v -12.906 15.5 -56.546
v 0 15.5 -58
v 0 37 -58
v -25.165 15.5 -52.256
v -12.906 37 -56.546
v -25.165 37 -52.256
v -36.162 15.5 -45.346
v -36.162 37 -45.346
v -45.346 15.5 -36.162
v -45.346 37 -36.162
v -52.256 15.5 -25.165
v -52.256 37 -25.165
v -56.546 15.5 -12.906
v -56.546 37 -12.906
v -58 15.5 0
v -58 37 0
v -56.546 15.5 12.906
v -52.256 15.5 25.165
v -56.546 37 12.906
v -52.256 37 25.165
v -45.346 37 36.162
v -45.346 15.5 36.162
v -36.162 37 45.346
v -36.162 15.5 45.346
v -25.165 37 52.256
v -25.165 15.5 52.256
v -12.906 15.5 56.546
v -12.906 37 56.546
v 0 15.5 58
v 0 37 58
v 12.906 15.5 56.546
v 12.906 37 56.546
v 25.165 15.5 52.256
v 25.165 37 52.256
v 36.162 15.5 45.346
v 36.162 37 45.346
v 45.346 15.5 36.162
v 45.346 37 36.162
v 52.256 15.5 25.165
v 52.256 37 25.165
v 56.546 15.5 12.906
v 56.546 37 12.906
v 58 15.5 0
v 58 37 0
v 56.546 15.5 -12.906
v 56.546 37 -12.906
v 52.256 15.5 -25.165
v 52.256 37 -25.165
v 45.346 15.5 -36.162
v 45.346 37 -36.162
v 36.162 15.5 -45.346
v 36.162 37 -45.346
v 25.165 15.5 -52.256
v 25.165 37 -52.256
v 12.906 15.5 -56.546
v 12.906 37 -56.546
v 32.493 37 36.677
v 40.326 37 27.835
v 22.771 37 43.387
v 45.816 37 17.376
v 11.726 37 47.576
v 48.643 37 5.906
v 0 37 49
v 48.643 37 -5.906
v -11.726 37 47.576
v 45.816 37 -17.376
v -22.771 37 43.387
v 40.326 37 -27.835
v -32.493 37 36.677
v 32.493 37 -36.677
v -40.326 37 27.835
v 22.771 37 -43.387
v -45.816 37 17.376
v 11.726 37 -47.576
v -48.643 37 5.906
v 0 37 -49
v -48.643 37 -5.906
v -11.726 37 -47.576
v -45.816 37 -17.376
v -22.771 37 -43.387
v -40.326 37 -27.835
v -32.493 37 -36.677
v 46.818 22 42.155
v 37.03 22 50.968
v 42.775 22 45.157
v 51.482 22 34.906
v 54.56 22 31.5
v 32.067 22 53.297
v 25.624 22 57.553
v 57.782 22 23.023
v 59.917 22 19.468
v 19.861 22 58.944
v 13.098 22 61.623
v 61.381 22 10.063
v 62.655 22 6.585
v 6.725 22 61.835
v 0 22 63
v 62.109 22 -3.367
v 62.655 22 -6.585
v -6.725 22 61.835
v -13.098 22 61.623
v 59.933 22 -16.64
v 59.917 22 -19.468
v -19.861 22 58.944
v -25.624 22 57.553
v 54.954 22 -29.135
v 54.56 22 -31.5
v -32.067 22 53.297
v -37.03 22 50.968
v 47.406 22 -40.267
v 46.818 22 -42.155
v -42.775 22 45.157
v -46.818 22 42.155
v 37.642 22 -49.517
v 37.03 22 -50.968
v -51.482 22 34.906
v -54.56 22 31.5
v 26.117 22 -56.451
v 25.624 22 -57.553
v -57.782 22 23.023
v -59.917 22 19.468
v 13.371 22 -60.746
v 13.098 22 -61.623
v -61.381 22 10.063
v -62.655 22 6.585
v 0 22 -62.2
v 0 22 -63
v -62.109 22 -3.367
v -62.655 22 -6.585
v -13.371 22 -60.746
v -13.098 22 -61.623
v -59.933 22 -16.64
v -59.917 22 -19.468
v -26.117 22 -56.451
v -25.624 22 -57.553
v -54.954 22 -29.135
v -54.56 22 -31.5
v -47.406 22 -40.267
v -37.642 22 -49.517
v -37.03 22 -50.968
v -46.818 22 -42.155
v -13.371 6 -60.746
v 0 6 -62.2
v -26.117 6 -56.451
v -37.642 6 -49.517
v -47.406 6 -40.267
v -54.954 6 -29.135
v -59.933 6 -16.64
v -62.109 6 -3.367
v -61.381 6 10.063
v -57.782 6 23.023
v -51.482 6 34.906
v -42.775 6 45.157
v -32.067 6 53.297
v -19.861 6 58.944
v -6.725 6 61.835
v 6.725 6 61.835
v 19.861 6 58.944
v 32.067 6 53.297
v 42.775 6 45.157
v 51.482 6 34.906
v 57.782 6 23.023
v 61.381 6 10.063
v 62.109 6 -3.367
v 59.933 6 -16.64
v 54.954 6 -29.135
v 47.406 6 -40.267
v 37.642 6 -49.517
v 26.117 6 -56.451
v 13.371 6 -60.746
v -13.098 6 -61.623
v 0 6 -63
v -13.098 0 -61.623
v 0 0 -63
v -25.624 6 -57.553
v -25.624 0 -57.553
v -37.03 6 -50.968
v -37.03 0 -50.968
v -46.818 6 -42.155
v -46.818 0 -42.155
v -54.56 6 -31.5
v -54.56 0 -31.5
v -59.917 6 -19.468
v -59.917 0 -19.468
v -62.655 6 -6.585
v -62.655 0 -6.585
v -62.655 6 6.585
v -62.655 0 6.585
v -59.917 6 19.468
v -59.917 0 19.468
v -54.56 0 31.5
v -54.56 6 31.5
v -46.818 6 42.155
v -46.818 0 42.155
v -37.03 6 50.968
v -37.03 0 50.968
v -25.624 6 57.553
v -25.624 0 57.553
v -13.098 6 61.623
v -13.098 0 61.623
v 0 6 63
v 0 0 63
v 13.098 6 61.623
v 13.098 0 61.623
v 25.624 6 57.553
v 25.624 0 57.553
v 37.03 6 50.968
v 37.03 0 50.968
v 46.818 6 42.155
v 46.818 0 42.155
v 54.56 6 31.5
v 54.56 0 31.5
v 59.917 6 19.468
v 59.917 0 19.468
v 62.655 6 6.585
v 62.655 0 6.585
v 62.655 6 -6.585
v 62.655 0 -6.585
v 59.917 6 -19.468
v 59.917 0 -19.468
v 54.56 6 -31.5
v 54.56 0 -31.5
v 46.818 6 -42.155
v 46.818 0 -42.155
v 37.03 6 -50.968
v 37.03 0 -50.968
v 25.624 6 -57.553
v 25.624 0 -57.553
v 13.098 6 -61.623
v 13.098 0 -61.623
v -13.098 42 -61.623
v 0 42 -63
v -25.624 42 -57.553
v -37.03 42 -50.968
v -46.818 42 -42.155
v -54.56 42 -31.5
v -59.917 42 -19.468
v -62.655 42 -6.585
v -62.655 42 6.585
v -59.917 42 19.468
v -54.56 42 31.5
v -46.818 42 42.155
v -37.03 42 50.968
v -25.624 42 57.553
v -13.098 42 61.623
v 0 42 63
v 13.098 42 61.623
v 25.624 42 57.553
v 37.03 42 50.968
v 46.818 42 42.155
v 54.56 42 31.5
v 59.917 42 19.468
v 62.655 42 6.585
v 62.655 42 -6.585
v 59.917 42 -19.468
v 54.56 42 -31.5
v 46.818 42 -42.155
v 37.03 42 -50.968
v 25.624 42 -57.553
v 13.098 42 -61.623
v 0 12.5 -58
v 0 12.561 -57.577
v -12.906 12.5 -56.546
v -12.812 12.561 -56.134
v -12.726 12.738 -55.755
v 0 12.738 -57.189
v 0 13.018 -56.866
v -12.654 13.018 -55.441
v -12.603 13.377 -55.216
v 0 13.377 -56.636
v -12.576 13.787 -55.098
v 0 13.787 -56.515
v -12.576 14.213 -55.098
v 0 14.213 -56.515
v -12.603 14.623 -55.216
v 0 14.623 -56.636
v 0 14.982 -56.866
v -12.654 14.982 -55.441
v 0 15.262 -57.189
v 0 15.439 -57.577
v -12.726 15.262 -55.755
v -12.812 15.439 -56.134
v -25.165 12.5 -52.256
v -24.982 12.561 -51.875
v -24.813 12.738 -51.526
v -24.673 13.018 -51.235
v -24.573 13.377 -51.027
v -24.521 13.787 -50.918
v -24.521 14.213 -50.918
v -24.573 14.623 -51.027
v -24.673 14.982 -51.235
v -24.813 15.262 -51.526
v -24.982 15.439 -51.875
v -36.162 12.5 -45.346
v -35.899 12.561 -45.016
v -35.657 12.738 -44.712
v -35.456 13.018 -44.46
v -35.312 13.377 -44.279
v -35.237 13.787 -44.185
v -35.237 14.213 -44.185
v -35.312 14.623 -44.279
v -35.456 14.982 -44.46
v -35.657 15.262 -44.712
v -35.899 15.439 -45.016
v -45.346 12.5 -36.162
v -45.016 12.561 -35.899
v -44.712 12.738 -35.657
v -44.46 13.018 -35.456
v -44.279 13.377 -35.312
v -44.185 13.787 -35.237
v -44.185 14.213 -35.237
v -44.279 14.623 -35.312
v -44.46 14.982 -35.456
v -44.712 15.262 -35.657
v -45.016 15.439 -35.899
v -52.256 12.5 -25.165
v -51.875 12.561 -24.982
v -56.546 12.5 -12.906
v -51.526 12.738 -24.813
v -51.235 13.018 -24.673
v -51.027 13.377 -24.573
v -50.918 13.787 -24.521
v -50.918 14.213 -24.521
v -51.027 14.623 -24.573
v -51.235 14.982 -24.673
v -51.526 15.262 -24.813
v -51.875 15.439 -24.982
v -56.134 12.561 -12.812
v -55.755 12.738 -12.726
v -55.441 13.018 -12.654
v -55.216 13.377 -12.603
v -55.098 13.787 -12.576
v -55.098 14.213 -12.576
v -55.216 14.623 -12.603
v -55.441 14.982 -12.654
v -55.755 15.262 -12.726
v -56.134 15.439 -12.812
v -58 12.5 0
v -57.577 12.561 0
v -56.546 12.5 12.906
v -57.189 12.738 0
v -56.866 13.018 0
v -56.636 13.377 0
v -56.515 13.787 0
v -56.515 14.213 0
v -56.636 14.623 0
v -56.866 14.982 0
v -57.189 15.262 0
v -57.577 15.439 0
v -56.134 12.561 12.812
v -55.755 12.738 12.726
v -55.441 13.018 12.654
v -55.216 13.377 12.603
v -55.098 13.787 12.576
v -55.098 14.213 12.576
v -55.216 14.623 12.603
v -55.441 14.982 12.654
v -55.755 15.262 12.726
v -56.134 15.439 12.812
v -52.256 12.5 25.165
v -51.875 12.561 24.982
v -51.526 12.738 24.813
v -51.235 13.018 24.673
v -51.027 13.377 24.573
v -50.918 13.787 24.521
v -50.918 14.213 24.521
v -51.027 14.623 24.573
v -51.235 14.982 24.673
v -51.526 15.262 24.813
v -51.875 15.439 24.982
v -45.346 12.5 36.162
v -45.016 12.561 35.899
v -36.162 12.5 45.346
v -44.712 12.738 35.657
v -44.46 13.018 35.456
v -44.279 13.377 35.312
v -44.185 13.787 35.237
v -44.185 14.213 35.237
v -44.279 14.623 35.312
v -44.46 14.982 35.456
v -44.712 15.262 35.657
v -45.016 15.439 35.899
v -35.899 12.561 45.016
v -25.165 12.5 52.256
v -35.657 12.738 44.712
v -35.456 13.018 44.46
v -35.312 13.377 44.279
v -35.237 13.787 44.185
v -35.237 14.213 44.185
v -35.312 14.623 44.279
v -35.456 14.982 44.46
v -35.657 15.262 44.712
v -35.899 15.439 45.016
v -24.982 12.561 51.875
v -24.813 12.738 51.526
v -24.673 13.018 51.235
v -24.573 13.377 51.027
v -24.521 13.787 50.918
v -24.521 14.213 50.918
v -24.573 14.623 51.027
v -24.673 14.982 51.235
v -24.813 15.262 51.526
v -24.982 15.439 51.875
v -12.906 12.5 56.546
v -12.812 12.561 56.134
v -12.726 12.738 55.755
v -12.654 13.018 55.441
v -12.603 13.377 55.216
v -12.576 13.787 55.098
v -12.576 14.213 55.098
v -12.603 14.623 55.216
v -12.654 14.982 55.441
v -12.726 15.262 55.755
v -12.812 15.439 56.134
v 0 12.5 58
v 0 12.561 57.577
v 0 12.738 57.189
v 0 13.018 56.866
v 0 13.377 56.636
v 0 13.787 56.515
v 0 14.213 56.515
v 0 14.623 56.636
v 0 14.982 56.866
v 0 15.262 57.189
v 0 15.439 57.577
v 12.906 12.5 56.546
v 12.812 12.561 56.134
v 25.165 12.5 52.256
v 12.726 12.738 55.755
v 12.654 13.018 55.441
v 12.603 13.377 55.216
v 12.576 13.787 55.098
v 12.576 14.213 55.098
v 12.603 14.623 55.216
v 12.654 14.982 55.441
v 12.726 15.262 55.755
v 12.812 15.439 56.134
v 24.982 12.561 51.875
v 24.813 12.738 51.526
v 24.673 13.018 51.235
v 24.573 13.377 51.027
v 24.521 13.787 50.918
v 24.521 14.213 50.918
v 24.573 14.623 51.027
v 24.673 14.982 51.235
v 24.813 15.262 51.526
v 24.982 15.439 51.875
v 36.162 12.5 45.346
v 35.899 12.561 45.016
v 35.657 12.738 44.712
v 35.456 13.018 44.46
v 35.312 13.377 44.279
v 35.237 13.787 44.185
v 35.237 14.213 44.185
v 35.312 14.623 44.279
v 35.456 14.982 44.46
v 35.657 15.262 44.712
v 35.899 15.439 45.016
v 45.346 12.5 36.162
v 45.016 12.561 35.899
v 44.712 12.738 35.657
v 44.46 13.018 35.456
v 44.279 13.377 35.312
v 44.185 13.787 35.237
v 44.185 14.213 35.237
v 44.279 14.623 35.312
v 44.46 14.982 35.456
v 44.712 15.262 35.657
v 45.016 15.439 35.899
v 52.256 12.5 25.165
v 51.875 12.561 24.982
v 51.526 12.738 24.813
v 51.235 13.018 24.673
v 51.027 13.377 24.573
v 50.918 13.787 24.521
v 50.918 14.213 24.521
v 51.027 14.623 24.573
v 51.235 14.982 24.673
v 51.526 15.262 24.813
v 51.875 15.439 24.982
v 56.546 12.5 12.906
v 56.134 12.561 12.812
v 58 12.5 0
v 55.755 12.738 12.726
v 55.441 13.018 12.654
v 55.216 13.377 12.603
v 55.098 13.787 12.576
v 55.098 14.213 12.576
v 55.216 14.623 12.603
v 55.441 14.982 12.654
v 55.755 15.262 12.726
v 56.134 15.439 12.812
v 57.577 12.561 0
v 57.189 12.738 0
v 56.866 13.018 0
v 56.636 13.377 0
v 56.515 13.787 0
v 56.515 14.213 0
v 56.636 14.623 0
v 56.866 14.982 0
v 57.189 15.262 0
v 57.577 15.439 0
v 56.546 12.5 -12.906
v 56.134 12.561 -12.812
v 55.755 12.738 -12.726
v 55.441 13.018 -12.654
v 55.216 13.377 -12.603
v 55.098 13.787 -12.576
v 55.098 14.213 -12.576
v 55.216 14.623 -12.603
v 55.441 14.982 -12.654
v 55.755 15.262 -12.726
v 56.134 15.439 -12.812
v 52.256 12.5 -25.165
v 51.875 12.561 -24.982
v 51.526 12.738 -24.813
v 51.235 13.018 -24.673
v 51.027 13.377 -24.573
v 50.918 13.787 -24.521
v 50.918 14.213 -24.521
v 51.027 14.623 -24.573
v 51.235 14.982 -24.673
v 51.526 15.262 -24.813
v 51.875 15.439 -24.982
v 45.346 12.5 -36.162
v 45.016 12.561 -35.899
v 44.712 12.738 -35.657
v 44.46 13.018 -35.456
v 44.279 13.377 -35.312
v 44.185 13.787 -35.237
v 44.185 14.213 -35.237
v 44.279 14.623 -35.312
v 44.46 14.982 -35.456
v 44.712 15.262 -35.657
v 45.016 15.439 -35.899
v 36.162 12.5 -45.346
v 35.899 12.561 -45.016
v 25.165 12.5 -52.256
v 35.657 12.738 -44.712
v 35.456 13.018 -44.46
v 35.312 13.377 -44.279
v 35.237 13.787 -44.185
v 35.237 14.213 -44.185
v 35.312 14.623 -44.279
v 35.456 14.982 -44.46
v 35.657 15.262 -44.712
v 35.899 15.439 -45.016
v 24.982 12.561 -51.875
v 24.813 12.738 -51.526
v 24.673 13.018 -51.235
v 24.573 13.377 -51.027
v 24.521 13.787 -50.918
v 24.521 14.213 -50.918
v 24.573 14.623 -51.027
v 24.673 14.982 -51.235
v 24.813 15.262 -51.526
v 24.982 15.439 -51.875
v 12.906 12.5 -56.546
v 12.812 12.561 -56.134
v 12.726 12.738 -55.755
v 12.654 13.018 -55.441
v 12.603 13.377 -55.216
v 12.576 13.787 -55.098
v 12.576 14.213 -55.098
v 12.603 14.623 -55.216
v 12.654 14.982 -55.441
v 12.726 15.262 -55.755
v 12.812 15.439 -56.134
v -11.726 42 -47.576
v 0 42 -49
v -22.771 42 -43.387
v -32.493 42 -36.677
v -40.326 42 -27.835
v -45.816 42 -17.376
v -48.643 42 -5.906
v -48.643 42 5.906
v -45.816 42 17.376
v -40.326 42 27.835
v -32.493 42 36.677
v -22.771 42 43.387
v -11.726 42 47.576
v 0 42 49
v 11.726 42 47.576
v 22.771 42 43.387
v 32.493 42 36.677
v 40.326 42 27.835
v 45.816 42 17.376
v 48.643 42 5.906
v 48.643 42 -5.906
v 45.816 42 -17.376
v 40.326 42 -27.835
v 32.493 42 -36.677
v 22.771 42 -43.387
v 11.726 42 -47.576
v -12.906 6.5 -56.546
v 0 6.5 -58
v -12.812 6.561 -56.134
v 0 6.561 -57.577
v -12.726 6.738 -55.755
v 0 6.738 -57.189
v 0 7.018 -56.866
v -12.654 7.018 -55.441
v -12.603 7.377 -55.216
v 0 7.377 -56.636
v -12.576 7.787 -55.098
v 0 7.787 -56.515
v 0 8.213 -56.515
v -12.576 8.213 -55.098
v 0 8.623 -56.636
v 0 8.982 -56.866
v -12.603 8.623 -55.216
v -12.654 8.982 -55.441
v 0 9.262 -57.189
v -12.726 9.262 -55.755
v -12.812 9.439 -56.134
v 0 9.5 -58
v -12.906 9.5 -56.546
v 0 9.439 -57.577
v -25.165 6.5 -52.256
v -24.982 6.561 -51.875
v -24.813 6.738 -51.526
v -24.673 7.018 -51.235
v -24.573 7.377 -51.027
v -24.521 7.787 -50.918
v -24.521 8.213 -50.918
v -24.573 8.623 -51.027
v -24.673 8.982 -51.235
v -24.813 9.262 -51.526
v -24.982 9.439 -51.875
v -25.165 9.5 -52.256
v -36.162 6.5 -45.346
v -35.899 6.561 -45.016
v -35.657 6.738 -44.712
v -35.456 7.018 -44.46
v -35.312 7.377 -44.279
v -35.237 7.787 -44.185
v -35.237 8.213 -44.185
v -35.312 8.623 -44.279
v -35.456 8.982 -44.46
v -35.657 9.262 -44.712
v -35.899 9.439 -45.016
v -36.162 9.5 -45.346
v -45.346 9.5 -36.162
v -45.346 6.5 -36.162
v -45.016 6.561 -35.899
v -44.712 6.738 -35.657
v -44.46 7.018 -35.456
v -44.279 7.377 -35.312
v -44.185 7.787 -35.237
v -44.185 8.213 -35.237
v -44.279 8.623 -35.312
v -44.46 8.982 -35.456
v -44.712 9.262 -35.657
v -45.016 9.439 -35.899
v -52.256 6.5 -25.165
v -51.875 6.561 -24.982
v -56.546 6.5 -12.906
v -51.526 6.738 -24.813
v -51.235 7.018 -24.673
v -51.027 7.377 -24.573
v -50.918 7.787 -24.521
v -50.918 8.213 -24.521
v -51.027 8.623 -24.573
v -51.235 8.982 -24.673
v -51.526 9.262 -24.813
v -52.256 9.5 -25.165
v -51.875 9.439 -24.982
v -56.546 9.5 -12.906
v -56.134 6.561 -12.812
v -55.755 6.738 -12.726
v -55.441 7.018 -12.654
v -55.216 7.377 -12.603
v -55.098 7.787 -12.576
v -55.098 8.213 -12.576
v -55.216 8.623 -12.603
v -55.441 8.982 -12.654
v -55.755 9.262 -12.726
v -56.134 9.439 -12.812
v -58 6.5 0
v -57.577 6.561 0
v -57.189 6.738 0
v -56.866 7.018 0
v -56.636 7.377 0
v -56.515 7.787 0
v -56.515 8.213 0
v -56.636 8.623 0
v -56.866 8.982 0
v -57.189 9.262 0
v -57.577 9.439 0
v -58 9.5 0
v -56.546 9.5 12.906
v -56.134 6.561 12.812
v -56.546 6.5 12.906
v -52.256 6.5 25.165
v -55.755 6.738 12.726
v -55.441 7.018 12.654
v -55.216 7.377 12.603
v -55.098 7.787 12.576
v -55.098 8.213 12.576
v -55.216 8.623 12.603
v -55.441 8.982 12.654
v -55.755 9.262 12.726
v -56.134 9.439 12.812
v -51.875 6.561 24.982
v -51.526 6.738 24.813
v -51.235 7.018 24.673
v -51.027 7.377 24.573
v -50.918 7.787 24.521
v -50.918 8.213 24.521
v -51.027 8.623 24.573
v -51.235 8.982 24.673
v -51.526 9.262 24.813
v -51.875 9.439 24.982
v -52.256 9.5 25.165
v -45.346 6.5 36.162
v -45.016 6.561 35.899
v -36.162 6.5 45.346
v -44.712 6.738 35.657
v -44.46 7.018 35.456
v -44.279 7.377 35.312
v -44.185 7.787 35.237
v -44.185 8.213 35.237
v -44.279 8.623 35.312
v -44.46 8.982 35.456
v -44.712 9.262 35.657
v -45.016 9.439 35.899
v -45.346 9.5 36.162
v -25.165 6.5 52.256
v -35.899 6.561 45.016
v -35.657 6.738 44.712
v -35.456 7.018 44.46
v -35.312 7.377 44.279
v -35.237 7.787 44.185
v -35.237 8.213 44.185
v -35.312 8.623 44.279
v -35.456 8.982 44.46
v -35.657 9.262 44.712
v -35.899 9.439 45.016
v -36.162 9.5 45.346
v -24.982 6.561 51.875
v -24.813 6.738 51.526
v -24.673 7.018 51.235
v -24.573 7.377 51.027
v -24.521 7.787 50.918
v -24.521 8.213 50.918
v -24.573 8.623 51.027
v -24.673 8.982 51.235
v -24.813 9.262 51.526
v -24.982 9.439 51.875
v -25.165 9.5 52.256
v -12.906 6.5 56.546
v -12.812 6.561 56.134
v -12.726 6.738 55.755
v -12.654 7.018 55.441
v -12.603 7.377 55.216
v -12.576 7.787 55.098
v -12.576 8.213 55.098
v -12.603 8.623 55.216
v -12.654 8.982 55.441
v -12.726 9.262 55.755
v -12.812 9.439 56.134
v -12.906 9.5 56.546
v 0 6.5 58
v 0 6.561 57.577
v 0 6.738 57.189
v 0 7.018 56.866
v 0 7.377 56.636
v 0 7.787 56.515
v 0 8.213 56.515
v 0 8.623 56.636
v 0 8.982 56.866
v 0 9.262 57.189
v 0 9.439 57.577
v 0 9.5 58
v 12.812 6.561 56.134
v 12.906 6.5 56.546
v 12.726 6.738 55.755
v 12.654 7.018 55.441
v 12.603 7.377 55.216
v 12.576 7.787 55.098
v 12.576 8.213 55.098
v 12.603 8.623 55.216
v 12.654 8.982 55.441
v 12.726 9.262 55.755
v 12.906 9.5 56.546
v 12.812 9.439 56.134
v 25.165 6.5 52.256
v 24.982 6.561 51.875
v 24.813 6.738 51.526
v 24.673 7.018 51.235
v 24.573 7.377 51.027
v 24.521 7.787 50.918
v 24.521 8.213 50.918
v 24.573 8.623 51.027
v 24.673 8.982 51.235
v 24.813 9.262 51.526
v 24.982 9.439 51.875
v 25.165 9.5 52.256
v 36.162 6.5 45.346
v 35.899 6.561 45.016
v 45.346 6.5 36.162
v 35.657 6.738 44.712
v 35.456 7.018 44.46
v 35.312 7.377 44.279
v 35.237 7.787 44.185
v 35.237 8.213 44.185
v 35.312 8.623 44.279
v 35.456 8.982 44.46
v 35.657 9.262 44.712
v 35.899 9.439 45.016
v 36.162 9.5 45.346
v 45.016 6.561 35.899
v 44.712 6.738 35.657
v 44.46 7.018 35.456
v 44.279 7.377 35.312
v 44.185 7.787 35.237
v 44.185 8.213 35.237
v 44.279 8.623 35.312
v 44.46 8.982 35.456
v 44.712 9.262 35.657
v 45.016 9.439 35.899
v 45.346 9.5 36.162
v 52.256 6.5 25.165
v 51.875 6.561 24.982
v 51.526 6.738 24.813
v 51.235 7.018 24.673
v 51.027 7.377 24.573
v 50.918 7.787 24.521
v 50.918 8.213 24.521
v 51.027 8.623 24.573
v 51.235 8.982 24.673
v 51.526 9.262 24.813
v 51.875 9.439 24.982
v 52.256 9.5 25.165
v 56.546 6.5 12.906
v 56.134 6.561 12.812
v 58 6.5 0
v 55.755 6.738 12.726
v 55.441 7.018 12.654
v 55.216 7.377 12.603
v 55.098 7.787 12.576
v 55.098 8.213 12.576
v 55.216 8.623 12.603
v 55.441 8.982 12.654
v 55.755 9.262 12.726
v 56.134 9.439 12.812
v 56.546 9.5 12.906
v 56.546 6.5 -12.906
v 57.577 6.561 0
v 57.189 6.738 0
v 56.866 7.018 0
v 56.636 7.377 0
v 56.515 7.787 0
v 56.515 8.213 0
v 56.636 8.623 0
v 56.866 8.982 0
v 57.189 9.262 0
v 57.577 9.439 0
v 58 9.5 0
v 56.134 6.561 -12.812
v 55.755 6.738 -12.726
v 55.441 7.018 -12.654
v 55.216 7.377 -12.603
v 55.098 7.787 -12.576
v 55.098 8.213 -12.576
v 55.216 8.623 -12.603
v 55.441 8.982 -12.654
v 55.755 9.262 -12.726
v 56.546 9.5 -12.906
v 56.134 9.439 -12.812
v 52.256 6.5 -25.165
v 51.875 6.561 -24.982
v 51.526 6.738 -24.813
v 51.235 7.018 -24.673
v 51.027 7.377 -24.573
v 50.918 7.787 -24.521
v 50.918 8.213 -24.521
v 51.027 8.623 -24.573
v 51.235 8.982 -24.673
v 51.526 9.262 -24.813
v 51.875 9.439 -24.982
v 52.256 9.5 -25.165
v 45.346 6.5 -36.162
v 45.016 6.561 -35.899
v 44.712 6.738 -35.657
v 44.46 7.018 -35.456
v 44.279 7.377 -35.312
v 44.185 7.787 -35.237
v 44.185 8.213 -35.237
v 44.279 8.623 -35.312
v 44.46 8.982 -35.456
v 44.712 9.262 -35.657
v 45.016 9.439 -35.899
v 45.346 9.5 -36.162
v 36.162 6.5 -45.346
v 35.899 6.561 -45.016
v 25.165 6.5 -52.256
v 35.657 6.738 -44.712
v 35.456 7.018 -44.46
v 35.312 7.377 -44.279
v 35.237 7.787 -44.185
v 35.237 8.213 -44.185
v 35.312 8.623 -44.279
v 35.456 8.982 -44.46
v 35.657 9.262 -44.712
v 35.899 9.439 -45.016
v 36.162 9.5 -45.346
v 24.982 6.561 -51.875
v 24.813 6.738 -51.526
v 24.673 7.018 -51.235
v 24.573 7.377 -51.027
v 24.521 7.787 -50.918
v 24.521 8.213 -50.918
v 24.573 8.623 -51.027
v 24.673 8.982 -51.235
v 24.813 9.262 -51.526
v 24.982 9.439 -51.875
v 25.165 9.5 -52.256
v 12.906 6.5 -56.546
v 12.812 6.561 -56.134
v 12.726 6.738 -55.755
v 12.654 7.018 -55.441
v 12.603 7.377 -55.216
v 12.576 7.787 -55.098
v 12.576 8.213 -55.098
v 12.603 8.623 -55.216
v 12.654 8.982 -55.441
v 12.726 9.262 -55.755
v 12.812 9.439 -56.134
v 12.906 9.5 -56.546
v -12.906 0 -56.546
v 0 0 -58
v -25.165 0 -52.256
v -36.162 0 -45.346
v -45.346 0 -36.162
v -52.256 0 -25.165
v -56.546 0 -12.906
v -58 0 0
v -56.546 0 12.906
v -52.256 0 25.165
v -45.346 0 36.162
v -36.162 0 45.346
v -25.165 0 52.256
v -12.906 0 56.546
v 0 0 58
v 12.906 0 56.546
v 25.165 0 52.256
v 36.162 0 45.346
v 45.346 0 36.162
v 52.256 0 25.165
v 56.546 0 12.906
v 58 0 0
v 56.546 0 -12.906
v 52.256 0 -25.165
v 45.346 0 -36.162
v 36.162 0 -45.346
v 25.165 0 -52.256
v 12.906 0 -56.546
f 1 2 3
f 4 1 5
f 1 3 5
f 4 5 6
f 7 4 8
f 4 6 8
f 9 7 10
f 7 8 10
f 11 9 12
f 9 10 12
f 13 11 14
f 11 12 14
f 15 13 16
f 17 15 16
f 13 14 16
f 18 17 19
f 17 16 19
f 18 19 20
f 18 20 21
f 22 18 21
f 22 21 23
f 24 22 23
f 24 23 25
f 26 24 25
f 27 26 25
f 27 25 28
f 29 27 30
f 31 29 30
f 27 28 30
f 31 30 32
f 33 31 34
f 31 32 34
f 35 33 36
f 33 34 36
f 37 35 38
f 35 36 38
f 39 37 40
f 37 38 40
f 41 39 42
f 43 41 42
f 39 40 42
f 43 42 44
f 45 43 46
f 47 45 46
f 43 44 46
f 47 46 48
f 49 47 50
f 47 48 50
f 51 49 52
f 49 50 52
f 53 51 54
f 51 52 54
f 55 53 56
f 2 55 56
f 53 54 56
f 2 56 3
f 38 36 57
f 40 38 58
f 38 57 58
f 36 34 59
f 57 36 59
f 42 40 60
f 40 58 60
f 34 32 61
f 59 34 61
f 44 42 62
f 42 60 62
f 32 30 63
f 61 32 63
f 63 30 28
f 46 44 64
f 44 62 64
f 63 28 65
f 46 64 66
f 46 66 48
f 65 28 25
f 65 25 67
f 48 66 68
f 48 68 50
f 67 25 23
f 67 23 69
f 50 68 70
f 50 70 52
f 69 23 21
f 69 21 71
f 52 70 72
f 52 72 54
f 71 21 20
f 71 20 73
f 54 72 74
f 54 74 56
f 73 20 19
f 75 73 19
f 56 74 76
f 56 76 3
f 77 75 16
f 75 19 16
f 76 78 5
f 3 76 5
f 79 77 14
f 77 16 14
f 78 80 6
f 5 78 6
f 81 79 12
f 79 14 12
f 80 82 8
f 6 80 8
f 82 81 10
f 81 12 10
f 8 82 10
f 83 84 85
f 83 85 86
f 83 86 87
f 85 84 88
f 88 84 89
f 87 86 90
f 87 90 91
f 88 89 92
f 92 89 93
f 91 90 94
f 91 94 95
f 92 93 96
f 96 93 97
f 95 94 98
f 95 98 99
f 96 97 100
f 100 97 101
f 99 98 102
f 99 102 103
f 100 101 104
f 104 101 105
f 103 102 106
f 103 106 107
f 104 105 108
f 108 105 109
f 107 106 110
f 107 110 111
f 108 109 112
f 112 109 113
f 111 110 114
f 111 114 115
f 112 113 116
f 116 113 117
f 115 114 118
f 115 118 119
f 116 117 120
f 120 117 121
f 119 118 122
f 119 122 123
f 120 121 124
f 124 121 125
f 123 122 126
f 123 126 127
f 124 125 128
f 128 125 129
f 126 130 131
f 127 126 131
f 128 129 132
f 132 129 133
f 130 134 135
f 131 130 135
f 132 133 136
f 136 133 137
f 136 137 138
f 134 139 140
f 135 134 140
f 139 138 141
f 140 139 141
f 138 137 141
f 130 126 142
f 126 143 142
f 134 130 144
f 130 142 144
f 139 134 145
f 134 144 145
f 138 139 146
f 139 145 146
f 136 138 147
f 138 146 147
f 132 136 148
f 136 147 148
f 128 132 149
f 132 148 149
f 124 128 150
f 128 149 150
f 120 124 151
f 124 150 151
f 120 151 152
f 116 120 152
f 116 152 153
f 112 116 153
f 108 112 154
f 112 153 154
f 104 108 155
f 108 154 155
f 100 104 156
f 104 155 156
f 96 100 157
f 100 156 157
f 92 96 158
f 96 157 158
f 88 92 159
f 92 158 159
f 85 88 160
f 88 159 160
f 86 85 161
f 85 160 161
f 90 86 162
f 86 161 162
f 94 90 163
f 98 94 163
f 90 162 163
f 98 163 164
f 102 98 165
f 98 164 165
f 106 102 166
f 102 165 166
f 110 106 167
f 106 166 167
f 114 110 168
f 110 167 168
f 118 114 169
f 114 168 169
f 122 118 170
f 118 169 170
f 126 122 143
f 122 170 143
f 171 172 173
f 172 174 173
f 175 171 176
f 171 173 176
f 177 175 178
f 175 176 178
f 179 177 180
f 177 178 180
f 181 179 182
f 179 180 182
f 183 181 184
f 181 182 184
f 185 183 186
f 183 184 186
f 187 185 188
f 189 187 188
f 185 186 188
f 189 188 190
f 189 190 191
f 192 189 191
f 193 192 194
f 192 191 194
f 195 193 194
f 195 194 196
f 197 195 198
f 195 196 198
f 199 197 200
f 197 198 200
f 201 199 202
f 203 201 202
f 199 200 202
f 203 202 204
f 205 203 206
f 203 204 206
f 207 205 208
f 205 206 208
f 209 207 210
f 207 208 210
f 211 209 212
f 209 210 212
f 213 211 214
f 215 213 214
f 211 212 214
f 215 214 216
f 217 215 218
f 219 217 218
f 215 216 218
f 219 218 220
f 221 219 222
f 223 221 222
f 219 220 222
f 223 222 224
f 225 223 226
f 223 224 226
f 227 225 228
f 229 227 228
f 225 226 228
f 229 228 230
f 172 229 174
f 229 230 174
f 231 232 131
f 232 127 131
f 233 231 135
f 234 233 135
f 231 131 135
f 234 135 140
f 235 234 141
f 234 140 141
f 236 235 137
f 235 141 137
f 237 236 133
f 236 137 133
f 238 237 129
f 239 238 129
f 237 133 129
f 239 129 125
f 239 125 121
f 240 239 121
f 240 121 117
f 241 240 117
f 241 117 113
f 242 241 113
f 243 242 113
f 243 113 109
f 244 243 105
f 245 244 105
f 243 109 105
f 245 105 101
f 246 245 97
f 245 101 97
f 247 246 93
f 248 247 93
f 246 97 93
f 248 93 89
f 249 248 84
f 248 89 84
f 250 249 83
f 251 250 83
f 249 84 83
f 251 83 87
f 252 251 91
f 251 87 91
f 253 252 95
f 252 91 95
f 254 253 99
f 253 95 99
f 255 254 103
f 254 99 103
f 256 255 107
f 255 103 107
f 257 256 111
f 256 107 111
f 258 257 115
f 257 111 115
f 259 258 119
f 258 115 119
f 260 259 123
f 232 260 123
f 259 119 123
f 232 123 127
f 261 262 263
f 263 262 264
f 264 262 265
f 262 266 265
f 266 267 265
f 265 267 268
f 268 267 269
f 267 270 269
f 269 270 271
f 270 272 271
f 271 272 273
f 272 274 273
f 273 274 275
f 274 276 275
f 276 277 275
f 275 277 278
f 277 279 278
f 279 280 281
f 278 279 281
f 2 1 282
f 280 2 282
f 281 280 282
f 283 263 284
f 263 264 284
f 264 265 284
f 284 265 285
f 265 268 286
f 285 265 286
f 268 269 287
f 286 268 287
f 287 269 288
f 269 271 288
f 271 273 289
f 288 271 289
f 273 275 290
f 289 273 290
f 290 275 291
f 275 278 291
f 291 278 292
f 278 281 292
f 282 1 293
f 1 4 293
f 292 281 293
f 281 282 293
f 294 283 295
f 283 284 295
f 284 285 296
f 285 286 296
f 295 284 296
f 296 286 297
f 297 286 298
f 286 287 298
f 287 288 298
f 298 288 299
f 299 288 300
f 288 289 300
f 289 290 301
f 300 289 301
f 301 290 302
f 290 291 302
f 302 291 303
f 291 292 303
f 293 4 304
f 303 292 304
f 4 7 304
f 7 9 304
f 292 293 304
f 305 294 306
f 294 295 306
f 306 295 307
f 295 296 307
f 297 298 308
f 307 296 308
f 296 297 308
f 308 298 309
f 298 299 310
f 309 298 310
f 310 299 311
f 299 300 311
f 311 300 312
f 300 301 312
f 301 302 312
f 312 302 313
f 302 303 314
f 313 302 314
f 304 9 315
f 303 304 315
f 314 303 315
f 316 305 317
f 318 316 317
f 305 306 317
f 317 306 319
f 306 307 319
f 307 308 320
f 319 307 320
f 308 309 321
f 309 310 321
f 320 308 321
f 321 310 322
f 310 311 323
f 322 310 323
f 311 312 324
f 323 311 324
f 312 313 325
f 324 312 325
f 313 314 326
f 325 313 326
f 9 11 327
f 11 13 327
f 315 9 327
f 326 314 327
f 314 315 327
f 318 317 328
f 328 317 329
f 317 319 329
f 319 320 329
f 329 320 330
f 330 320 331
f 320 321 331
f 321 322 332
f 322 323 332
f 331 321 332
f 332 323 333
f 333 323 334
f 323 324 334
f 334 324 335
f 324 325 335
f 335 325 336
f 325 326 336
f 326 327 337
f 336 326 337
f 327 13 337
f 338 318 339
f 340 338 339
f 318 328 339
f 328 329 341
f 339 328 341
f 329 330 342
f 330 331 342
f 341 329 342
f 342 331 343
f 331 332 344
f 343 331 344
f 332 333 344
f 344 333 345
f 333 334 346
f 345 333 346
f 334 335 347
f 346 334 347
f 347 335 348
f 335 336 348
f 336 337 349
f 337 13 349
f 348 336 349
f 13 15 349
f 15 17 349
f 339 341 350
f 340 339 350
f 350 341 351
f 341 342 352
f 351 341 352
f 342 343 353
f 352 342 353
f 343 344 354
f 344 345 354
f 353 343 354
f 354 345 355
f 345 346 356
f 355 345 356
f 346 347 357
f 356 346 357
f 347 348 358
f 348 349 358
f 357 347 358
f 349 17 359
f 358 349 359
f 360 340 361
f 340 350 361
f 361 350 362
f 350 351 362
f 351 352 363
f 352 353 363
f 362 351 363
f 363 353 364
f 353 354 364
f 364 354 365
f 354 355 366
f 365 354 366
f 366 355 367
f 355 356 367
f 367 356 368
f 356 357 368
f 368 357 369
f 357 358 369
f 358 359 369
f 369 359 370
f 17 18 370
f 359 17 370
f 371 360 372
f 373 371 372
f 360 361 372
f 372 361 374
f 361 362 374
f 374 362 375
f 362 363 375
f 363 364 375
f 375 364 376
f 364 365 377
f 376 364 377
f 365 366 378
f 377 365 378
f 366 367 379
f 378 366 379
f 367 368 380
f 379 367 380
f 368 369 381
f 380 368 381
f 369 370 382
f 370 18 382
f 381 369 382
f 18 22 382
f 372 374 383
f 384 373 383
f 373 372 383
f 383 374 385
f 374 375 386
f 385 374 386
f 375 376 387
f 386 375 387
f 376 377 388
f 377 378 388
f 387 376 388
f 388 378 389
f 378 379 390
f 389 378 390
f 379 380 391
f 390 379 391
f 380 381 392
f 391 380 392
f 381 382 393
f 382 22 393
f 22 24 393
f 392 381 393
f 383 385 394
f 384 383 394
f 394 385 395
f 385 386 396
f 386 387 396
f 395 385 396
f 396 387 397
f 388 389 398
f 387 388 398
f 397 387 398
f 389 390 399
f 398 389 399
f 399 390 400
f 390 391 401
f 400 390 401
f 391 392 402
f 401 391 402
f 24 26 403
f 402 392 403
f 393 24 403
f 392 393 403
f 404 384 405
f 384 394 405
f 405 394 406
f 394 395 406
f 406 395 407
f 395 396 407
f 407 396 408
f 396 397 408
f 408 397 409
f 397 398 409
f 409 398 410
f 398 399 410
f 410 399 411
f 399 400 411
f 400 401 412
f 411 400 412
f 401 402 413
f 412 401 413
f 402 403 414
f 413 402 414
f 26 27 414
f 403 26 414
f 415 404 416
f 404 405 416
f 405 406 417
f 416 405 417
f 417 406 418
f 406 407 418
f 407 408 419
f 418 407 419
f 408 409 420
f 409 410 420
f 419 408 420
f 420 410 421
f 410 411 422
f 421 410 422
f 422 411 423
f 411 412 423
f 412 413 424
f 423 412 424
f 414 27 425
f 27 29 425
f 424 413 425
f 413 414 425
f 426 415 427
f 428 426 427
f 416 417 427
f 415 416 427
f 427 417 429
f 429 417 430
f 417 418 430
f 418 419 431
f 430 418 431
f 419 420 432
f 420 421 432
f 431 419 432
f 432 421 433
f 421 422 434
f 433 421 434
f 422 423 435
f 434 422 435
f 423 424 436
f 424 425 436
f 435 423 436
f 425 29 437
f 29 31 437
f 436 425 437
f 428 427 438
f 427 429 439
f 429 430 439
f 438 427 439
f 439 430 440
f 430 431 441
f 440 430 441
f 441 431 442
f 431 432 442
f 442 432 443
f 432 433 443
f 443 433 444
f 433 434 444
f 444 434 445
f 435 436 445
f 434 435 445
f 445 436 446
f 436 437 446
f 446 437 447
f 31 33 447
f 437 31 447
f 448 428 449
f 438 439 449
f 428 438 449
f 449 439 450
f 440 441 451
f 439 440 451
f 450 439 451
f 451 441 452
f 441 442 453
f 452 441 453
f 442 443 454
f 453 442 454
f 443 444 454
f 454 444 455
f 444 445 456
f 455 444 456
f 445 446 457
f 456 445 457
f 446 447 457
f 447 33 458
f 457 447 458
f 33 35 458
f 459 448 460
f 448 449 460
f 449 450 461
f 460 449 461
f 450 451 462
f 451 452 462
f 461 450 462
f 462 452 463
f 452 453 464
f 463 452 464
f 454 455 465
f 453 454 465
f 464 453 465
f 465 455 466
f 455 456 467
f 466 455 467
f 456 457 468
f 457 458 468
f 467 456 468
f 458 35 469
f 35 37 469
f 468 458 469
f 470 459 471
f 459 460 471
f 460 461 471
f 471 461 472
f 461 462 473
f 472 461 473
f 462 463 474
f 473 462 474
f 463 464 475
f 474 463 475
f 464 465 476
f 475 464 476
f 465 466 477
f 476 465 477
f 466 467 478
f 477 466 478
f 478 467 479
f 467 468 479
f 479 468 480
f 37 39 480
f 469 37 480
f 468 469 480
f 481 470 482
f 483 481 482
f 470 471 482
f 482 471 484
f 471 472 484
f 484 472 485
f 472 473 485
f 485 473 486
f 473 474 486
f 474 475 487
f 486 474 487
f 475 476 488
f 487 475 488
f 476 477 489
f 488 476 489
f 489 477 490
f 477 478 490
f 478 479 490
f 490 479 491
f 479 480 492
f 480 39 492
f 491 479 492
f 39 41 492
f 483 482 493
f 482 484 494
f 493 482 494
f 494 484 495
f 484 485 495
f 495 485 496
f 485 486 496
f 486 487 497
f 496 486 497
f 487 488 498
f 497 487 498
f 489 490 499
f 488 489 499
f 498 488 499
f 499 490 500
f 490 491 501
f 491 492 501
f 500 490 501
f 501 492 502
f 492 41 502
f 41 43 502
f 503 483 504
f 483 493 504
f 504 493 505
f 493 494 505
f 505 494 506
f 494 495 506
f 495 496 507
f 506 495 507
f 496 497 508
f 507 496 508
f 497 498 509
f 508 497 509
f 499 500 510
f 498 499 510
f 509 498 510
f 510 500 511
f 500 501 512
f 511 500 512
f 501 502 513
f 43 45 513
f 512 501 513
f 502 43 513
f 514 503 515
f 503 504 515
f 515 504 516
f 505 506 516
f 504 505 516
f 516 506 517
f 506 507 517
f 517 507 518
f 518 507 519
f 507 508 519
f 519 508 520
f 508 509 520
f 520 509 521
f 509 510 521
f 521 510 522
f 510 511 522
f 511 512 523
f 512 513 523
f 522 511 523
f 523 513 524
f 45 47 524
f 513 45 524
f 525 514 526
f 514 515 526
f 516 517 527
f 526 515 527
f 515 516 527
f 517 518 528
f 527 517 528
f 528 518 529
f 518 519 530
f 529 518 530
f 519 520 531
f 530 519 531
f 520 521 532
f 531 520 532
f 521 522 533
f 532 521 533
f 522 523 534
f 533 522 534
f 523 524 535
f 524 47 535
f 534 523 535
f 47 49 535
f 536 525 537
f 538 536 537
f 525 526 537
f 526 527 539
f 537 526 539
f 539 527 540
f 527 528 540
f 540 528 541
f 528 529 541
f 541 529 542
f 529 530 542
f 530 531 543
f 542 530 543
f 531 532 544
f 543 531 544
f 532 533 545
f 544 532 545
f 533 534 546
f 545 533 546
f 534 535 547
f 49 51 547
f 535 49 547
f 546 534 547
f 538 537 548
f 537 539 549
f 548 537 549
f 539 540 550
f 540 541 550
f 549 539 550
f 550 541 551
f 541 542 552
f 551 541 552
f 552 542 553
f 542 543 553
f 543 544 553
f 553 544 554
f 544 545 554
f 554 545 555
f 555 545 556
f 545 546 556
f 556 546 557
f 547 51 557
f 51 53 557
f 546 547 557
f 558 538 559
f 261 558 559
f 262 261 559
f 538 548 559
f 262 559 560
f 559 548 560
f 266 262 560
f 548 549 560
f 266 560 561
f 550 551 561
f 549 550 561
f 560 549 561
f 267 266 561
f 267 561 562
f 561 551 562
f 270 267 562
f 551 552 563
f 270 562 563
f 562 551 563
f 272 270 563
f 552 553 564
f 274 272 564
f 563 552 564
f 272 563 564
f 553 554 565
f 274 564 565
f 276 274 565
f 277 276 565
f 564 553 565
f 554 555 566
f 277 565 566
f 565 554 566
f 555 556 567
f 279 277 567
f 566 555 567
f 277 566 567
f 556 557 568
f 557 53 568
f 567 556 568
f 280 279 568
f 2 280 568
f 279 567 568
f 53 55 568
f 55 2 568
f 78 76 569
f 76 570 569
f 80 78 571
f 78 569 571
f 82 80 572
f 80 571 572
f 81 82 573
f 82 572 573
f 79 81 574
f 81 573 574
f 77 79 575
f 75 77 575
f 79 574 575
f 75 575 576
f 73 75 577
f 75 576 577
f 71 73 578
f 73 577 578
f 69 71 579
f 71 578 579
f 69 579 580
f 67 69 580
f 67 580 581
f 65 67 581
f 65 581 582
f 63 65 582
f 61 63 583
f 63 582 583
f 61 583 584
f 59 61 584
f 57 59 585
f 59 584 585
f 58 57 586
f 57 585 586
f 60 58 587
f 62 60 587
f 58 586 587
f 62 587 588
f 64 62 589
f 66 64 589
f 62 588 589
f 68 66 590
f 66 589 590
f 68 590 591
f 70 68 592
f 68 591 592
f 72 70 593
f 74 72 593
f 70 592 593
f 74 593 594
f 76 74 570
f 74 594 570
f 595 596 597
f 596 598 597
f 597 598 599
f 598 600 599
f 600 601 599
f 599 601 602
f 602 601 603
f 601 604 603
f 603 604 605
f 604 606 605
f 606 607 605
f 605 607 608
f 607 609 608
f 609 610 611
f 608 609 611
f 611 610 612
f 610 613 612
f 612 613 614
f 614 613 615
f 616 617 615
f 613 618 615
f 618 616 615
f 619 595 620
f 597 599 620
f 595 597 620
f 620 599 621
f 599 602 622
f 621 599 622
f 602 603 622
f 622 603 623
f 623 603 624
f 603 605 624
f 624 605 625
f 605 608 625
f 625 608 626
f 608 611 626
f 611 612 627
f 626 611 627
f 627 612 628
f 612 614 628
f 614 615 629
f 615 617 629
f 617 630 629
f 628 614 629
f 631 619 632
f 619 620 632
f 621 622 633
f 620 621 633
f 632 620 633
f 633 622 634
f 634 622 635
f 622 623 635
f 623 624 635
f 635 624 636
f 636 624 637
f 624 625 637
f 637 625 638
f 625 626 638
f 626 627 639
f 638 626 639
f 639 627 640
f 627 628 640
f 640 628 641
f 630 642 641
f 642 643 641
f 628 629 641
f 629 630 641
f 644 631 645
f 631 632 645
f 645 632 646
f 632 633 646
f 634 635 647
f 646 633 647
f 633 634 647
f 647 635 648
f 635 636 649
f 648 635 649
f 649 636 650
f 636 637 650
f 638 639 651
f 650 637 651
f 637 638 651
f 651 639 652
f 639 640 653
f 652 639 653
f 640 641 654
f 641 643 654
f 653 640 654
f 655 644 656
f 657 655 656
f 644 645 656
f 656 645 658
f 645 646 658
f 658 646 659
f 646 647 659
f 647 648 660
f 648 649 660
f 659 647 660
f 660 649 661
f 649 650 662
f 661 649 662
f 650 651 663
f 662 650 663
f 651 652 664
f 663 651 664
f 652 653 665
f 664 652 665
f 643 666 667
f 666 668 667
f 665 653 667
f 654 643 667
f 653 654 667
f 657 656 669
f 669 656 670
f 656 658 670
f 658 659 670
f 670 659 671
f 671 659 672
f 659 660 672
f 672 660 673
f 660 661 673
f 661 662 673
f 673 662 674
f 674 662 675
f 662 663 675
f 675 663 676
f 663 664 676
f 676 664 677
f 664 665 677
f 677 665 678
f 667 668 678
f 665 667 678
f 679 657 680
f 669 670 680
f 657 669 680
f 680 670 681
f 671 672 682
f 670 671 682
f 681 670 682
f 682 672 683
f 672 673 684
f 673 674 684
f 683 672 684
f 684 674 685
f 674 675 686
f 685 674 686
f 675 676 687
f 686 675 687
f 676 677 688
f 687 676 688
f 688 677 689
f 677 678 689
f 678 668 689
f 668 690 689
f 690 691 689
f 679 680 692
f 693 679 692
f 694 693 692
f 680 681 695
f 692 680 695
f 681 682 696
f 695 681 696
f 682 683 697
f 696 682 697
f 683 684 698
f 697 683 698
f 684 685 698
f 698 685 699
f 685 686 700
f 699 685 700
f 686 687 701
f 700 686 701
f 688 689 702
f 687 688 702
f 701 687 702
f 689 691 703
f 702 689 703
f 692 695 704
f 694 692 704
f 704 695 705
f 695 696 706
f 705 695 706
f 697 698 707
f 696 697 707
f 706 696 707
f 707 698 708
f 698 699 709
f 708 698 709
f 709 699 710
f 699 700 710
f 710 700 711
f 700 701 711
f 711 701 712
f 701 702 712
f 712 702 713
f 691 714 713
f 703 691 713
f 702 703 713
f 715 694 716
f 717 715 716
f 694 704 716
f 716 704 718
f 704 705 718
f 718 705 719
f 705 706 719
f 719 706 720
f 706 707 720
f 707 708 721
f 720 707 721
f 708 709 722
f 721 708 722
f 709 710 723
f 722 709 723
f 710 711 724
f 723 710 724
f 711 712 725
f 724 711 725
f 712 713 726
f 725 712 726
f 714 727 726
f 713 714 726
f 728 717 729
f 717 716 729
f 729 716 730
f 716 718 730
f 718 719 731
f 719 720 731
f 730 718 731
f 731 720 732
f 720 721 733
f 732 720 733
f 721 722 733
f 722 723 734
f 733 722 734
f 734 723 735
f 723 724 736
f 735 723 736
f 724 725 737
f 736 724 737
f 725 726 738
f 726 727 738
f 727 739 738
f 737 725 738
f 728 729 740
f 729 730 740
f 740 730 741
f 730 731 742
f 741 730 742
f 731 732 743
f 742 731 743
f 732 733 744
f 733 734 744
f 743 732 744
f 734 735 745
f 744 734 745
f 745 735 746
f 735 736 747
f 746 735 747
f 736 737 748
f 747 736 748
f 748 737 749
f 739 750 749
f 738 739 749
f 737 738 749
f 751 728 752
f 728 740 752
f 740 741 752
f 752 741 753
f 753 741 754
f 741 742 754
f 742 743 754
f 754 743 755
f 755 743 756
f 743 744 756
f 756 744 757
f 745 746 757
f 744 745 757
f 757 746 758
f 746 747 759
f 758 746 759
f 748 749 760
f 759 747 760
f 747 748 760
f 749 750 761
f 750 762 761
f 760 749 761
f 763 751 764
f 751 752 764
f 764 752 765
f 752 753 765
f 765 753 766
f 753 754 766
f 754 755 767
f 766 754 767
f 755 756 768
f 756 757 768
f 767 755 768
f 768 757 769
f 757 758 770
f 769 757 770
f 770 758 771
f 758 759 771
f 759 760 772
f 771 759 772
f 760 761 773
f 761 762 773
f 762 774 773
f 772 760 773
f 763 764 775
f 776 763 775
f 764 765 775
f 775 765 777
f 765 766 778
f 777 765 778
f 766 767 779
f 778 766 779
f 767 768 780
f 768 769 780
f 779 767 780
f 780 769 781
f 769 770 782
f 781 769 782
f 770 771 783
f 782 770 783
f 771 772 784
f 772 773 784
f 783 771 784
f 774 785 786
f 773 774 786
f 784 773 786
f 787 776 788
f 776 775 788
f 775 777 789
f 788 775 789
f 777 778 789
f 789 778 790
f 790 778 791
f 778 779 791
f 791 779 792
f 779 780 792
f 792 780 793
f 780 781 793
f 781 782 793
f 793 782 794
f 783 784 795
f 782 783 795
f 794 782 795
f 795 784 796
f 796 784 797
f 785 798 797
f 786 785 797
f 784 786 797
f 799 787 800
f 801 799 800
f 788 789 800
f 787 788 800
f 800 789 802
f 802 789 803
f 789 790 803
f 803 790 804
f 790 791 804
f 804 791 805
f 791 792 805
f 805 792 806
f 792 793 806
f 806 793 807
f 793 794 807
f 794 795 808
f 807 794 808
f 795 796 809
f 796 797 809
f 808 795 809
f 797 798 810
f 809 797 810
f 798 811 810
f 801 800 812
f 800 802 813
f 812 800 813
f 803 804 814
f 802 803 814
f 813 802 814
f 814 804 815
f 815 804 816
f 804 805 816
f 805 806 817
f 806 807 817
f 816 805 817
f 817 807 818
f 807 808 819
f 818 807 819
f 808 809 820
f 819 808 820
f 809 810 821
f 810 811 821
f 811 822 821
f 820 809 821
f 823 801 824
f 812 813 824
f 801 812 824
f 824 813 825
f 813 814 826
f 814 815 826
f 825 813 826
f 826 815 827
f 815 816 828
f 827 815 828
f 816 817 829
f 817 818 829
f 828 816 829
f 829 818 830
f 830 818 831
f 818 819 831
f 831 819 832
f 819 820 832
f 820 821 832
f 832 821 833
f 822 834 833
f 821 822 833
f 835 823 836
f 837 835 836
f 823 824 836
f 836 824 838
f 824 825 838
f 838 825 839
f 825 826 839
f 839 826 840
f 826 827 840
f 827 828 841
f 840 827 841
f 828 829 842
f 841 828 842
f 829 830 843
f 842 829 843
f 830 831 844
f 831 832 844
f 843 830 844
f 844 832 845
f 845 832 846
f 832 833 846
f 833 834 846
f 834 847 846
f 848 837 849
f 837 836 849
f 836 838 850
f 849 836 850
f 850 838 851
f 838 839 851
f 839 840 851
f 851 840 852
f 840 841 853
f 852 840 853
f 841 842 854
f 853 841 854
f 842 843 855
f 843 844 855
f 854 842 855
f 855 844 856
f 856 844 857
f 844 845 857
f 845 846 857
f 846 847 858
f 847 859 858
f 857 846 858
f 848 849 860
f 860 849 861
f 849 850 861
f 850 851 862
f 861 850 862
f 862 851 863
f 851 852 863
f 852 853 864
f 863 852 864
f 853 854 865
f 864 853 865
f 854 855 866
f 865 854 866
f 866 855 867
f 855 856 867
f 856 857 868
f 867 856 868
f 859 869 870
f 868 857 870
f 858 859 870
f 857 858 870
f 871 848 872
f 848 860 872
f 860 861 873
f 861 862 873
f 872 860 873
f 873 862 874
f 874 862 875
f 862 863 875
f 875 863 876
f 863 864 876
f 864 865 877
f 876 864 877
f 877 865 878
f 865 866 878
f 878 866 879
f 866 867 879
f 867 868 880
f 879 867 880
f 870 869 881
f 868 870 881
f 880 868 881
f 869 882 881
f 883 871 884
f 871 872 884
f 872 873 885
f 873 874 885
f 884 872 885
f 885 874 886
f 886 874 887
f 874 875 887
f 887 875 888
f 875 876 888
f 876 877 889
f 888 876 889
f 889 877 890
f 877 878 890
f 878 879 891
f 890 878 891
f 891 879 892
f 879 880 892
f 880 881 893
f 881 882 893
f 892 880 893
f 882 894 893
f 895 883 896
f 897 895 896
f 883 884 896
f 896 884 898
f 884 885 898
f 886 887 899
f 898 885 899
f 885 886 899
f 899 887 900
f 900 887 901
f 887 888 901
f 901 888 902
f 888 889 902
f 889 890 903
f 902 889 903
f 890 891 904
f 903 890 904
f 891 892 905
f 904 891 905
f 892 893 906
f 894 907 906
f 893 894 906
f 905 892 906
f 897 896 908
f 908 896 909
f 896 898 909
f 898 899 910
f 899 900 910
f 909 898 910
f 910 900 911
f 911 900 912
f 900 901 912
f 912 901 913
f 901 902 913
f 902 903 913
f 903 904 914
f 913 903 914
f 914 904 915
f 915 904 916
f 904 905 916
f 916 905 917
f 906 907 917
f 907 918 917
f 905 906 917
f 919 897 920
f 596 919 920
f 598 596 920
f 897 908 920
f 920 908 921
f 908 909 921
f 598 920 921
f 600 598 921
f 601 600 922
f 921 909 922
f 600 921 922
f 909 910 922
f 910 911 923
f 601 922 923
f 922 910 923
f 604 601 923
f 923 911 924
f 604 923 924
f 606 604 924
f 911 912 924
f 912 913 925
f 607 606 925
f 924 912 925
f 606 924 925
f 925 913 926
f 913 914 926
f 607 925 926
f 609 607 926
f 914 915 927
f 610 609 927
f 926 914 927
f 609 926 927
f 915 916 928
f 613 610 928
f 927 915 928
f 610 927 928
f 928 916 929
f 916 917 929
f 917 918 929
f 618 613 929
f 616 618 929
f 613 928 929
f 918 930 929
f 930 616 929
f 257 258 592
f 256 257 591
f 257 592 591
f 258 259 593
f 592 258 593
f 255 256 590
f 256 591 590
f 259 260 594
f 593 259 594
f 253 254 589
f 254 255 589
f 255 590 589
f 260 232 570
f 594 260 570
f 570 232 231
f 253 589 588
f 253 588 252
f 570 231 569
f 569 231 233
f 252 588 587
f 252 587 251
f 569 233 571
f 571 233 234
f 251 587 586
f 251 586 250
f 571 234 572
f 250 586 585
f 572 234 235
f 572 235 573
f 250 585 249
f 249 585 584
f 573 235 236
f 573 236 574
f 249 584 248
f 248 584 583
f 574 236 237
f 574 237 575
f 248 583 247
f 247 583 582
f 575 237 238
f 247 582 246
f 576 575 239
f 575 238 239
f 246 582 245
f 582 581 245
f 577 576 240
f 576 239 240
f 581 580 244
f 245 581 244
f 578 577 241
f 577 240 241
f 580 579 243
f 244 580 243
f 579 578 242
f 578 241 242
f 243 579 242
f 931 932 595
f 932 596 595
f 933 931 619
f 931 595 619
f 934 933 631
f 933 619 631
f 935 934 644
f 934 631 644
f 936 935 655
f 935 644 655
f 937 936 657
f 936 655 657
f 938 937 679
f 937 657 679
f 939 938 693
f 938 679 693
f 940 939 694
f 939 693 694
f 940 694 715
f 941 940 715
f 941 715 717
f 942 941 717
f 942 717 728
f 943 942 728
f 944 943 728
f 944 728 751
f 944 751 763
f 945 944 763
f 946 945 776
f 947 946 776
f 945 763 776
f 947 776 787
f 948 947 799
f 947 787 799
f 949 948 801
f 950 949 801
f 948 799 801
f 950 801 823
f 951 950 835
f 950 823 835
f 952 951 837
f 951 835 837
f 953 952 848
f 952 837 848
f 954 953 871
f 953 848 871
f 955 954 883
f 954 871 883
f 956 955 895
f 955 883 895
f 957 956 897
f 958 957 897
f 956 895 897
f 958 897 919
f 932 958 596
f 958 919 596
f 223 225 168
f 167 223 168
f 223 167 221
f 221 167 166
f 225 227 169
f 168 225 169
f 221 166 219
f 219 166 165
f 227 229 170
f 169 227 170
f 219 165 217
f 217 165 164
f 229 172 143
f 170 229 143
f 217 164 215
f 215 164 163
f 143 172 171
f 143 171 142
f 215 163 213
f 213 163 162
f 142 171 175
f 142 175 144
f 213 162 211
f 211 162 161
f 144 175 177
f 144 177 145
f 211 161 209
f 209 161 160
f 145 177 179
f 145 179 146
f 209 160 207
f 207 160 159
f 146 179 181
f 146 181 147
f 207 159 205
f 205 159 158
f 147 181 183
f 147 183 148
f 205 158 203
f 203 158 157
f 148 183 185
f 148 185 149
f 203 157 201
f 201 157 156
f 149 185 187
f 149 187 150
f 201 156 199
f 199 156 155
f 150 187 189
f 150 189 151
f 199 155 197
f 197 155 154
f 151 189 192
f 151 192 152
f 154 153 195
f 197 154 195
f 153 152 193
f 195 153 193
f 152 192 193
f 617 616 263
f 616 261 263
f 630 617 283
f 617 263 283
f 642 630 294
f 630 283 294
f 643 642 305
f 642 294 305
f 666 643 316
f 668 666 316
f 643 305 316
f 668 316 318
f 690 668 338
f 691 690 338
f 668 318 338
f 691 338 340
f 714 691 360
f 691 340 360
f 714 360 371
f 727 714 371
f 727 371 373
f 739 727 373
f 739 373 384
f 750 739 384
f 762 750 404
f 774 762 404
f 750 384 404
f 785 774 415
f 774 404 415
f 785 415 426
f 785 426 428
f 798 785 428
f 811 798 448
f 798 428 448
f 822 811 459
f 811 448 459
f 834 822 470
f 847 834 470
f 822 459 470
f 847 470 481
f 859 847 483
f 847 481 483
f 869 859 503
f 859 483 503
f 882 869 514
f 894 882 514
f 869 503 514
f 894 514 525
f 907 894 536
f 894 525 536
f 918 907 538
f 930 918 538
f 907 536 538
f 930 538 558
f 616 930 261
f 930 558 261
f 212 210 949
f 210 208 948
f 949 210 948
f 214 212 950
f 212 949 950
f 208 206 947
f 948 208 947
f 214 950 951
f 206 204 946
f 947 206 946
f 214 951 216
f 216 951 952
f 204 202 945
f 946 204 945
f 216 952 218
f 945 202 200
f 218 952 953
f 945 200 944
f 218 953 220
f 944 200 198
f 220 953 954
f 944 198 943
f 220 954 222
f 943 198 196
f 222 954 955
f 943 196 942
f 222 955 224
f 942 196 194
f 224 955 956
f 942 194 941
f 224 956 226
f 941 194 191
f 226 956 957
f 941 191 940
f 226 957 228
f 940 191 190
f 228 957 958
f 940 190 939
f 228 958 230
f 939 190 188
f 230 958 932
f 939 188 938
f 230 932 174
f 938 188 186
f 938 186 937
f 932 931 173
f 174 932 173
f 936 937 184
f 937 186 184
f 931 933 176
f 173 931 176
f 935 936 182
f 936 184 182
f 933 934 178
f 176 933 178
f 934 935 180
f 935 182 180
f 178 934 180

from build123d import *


with BuildPart() as part:
    # Sketch1 → Revolve1 (revolve)
    with BuildSketch(Plane.XY, mode=Mode.PRIVATE) as revolve1_sk:
        with BuildLine():
            Line((49, 42), (63, 42))
            Line((63, 42), (63, 22))
            Line((63, 22), (62.2, 22))
            Line((62.2, 22), (62.2, 6))
            Line((62.2, 6), (63, 6))
            Line((63, 6), (63, 0))
            Line((63, 0), (58, 0))
            Line((58, 0), (58, 6.5))
            ThreePointArc((58, 6.5), (56.5, 8), (58, 9.5))
            Line((58, 9.5), (58, 12.5))
            ThreePointArc((58, 12.5), (56.5, 14), (58, 15.5))
            Line((58, 15.5), (58, 37))
            Line((58, 37), (49, 37))
            Line((49, 37), (49, 42))
        make_face()
    revolve(revolve1_sk.sketch.rotate(Axis((0, 0, 0), (0, 1, 0)), 90), axis=Axis((0, 0, 0), (0, 1, 0)))


solid = part.part
